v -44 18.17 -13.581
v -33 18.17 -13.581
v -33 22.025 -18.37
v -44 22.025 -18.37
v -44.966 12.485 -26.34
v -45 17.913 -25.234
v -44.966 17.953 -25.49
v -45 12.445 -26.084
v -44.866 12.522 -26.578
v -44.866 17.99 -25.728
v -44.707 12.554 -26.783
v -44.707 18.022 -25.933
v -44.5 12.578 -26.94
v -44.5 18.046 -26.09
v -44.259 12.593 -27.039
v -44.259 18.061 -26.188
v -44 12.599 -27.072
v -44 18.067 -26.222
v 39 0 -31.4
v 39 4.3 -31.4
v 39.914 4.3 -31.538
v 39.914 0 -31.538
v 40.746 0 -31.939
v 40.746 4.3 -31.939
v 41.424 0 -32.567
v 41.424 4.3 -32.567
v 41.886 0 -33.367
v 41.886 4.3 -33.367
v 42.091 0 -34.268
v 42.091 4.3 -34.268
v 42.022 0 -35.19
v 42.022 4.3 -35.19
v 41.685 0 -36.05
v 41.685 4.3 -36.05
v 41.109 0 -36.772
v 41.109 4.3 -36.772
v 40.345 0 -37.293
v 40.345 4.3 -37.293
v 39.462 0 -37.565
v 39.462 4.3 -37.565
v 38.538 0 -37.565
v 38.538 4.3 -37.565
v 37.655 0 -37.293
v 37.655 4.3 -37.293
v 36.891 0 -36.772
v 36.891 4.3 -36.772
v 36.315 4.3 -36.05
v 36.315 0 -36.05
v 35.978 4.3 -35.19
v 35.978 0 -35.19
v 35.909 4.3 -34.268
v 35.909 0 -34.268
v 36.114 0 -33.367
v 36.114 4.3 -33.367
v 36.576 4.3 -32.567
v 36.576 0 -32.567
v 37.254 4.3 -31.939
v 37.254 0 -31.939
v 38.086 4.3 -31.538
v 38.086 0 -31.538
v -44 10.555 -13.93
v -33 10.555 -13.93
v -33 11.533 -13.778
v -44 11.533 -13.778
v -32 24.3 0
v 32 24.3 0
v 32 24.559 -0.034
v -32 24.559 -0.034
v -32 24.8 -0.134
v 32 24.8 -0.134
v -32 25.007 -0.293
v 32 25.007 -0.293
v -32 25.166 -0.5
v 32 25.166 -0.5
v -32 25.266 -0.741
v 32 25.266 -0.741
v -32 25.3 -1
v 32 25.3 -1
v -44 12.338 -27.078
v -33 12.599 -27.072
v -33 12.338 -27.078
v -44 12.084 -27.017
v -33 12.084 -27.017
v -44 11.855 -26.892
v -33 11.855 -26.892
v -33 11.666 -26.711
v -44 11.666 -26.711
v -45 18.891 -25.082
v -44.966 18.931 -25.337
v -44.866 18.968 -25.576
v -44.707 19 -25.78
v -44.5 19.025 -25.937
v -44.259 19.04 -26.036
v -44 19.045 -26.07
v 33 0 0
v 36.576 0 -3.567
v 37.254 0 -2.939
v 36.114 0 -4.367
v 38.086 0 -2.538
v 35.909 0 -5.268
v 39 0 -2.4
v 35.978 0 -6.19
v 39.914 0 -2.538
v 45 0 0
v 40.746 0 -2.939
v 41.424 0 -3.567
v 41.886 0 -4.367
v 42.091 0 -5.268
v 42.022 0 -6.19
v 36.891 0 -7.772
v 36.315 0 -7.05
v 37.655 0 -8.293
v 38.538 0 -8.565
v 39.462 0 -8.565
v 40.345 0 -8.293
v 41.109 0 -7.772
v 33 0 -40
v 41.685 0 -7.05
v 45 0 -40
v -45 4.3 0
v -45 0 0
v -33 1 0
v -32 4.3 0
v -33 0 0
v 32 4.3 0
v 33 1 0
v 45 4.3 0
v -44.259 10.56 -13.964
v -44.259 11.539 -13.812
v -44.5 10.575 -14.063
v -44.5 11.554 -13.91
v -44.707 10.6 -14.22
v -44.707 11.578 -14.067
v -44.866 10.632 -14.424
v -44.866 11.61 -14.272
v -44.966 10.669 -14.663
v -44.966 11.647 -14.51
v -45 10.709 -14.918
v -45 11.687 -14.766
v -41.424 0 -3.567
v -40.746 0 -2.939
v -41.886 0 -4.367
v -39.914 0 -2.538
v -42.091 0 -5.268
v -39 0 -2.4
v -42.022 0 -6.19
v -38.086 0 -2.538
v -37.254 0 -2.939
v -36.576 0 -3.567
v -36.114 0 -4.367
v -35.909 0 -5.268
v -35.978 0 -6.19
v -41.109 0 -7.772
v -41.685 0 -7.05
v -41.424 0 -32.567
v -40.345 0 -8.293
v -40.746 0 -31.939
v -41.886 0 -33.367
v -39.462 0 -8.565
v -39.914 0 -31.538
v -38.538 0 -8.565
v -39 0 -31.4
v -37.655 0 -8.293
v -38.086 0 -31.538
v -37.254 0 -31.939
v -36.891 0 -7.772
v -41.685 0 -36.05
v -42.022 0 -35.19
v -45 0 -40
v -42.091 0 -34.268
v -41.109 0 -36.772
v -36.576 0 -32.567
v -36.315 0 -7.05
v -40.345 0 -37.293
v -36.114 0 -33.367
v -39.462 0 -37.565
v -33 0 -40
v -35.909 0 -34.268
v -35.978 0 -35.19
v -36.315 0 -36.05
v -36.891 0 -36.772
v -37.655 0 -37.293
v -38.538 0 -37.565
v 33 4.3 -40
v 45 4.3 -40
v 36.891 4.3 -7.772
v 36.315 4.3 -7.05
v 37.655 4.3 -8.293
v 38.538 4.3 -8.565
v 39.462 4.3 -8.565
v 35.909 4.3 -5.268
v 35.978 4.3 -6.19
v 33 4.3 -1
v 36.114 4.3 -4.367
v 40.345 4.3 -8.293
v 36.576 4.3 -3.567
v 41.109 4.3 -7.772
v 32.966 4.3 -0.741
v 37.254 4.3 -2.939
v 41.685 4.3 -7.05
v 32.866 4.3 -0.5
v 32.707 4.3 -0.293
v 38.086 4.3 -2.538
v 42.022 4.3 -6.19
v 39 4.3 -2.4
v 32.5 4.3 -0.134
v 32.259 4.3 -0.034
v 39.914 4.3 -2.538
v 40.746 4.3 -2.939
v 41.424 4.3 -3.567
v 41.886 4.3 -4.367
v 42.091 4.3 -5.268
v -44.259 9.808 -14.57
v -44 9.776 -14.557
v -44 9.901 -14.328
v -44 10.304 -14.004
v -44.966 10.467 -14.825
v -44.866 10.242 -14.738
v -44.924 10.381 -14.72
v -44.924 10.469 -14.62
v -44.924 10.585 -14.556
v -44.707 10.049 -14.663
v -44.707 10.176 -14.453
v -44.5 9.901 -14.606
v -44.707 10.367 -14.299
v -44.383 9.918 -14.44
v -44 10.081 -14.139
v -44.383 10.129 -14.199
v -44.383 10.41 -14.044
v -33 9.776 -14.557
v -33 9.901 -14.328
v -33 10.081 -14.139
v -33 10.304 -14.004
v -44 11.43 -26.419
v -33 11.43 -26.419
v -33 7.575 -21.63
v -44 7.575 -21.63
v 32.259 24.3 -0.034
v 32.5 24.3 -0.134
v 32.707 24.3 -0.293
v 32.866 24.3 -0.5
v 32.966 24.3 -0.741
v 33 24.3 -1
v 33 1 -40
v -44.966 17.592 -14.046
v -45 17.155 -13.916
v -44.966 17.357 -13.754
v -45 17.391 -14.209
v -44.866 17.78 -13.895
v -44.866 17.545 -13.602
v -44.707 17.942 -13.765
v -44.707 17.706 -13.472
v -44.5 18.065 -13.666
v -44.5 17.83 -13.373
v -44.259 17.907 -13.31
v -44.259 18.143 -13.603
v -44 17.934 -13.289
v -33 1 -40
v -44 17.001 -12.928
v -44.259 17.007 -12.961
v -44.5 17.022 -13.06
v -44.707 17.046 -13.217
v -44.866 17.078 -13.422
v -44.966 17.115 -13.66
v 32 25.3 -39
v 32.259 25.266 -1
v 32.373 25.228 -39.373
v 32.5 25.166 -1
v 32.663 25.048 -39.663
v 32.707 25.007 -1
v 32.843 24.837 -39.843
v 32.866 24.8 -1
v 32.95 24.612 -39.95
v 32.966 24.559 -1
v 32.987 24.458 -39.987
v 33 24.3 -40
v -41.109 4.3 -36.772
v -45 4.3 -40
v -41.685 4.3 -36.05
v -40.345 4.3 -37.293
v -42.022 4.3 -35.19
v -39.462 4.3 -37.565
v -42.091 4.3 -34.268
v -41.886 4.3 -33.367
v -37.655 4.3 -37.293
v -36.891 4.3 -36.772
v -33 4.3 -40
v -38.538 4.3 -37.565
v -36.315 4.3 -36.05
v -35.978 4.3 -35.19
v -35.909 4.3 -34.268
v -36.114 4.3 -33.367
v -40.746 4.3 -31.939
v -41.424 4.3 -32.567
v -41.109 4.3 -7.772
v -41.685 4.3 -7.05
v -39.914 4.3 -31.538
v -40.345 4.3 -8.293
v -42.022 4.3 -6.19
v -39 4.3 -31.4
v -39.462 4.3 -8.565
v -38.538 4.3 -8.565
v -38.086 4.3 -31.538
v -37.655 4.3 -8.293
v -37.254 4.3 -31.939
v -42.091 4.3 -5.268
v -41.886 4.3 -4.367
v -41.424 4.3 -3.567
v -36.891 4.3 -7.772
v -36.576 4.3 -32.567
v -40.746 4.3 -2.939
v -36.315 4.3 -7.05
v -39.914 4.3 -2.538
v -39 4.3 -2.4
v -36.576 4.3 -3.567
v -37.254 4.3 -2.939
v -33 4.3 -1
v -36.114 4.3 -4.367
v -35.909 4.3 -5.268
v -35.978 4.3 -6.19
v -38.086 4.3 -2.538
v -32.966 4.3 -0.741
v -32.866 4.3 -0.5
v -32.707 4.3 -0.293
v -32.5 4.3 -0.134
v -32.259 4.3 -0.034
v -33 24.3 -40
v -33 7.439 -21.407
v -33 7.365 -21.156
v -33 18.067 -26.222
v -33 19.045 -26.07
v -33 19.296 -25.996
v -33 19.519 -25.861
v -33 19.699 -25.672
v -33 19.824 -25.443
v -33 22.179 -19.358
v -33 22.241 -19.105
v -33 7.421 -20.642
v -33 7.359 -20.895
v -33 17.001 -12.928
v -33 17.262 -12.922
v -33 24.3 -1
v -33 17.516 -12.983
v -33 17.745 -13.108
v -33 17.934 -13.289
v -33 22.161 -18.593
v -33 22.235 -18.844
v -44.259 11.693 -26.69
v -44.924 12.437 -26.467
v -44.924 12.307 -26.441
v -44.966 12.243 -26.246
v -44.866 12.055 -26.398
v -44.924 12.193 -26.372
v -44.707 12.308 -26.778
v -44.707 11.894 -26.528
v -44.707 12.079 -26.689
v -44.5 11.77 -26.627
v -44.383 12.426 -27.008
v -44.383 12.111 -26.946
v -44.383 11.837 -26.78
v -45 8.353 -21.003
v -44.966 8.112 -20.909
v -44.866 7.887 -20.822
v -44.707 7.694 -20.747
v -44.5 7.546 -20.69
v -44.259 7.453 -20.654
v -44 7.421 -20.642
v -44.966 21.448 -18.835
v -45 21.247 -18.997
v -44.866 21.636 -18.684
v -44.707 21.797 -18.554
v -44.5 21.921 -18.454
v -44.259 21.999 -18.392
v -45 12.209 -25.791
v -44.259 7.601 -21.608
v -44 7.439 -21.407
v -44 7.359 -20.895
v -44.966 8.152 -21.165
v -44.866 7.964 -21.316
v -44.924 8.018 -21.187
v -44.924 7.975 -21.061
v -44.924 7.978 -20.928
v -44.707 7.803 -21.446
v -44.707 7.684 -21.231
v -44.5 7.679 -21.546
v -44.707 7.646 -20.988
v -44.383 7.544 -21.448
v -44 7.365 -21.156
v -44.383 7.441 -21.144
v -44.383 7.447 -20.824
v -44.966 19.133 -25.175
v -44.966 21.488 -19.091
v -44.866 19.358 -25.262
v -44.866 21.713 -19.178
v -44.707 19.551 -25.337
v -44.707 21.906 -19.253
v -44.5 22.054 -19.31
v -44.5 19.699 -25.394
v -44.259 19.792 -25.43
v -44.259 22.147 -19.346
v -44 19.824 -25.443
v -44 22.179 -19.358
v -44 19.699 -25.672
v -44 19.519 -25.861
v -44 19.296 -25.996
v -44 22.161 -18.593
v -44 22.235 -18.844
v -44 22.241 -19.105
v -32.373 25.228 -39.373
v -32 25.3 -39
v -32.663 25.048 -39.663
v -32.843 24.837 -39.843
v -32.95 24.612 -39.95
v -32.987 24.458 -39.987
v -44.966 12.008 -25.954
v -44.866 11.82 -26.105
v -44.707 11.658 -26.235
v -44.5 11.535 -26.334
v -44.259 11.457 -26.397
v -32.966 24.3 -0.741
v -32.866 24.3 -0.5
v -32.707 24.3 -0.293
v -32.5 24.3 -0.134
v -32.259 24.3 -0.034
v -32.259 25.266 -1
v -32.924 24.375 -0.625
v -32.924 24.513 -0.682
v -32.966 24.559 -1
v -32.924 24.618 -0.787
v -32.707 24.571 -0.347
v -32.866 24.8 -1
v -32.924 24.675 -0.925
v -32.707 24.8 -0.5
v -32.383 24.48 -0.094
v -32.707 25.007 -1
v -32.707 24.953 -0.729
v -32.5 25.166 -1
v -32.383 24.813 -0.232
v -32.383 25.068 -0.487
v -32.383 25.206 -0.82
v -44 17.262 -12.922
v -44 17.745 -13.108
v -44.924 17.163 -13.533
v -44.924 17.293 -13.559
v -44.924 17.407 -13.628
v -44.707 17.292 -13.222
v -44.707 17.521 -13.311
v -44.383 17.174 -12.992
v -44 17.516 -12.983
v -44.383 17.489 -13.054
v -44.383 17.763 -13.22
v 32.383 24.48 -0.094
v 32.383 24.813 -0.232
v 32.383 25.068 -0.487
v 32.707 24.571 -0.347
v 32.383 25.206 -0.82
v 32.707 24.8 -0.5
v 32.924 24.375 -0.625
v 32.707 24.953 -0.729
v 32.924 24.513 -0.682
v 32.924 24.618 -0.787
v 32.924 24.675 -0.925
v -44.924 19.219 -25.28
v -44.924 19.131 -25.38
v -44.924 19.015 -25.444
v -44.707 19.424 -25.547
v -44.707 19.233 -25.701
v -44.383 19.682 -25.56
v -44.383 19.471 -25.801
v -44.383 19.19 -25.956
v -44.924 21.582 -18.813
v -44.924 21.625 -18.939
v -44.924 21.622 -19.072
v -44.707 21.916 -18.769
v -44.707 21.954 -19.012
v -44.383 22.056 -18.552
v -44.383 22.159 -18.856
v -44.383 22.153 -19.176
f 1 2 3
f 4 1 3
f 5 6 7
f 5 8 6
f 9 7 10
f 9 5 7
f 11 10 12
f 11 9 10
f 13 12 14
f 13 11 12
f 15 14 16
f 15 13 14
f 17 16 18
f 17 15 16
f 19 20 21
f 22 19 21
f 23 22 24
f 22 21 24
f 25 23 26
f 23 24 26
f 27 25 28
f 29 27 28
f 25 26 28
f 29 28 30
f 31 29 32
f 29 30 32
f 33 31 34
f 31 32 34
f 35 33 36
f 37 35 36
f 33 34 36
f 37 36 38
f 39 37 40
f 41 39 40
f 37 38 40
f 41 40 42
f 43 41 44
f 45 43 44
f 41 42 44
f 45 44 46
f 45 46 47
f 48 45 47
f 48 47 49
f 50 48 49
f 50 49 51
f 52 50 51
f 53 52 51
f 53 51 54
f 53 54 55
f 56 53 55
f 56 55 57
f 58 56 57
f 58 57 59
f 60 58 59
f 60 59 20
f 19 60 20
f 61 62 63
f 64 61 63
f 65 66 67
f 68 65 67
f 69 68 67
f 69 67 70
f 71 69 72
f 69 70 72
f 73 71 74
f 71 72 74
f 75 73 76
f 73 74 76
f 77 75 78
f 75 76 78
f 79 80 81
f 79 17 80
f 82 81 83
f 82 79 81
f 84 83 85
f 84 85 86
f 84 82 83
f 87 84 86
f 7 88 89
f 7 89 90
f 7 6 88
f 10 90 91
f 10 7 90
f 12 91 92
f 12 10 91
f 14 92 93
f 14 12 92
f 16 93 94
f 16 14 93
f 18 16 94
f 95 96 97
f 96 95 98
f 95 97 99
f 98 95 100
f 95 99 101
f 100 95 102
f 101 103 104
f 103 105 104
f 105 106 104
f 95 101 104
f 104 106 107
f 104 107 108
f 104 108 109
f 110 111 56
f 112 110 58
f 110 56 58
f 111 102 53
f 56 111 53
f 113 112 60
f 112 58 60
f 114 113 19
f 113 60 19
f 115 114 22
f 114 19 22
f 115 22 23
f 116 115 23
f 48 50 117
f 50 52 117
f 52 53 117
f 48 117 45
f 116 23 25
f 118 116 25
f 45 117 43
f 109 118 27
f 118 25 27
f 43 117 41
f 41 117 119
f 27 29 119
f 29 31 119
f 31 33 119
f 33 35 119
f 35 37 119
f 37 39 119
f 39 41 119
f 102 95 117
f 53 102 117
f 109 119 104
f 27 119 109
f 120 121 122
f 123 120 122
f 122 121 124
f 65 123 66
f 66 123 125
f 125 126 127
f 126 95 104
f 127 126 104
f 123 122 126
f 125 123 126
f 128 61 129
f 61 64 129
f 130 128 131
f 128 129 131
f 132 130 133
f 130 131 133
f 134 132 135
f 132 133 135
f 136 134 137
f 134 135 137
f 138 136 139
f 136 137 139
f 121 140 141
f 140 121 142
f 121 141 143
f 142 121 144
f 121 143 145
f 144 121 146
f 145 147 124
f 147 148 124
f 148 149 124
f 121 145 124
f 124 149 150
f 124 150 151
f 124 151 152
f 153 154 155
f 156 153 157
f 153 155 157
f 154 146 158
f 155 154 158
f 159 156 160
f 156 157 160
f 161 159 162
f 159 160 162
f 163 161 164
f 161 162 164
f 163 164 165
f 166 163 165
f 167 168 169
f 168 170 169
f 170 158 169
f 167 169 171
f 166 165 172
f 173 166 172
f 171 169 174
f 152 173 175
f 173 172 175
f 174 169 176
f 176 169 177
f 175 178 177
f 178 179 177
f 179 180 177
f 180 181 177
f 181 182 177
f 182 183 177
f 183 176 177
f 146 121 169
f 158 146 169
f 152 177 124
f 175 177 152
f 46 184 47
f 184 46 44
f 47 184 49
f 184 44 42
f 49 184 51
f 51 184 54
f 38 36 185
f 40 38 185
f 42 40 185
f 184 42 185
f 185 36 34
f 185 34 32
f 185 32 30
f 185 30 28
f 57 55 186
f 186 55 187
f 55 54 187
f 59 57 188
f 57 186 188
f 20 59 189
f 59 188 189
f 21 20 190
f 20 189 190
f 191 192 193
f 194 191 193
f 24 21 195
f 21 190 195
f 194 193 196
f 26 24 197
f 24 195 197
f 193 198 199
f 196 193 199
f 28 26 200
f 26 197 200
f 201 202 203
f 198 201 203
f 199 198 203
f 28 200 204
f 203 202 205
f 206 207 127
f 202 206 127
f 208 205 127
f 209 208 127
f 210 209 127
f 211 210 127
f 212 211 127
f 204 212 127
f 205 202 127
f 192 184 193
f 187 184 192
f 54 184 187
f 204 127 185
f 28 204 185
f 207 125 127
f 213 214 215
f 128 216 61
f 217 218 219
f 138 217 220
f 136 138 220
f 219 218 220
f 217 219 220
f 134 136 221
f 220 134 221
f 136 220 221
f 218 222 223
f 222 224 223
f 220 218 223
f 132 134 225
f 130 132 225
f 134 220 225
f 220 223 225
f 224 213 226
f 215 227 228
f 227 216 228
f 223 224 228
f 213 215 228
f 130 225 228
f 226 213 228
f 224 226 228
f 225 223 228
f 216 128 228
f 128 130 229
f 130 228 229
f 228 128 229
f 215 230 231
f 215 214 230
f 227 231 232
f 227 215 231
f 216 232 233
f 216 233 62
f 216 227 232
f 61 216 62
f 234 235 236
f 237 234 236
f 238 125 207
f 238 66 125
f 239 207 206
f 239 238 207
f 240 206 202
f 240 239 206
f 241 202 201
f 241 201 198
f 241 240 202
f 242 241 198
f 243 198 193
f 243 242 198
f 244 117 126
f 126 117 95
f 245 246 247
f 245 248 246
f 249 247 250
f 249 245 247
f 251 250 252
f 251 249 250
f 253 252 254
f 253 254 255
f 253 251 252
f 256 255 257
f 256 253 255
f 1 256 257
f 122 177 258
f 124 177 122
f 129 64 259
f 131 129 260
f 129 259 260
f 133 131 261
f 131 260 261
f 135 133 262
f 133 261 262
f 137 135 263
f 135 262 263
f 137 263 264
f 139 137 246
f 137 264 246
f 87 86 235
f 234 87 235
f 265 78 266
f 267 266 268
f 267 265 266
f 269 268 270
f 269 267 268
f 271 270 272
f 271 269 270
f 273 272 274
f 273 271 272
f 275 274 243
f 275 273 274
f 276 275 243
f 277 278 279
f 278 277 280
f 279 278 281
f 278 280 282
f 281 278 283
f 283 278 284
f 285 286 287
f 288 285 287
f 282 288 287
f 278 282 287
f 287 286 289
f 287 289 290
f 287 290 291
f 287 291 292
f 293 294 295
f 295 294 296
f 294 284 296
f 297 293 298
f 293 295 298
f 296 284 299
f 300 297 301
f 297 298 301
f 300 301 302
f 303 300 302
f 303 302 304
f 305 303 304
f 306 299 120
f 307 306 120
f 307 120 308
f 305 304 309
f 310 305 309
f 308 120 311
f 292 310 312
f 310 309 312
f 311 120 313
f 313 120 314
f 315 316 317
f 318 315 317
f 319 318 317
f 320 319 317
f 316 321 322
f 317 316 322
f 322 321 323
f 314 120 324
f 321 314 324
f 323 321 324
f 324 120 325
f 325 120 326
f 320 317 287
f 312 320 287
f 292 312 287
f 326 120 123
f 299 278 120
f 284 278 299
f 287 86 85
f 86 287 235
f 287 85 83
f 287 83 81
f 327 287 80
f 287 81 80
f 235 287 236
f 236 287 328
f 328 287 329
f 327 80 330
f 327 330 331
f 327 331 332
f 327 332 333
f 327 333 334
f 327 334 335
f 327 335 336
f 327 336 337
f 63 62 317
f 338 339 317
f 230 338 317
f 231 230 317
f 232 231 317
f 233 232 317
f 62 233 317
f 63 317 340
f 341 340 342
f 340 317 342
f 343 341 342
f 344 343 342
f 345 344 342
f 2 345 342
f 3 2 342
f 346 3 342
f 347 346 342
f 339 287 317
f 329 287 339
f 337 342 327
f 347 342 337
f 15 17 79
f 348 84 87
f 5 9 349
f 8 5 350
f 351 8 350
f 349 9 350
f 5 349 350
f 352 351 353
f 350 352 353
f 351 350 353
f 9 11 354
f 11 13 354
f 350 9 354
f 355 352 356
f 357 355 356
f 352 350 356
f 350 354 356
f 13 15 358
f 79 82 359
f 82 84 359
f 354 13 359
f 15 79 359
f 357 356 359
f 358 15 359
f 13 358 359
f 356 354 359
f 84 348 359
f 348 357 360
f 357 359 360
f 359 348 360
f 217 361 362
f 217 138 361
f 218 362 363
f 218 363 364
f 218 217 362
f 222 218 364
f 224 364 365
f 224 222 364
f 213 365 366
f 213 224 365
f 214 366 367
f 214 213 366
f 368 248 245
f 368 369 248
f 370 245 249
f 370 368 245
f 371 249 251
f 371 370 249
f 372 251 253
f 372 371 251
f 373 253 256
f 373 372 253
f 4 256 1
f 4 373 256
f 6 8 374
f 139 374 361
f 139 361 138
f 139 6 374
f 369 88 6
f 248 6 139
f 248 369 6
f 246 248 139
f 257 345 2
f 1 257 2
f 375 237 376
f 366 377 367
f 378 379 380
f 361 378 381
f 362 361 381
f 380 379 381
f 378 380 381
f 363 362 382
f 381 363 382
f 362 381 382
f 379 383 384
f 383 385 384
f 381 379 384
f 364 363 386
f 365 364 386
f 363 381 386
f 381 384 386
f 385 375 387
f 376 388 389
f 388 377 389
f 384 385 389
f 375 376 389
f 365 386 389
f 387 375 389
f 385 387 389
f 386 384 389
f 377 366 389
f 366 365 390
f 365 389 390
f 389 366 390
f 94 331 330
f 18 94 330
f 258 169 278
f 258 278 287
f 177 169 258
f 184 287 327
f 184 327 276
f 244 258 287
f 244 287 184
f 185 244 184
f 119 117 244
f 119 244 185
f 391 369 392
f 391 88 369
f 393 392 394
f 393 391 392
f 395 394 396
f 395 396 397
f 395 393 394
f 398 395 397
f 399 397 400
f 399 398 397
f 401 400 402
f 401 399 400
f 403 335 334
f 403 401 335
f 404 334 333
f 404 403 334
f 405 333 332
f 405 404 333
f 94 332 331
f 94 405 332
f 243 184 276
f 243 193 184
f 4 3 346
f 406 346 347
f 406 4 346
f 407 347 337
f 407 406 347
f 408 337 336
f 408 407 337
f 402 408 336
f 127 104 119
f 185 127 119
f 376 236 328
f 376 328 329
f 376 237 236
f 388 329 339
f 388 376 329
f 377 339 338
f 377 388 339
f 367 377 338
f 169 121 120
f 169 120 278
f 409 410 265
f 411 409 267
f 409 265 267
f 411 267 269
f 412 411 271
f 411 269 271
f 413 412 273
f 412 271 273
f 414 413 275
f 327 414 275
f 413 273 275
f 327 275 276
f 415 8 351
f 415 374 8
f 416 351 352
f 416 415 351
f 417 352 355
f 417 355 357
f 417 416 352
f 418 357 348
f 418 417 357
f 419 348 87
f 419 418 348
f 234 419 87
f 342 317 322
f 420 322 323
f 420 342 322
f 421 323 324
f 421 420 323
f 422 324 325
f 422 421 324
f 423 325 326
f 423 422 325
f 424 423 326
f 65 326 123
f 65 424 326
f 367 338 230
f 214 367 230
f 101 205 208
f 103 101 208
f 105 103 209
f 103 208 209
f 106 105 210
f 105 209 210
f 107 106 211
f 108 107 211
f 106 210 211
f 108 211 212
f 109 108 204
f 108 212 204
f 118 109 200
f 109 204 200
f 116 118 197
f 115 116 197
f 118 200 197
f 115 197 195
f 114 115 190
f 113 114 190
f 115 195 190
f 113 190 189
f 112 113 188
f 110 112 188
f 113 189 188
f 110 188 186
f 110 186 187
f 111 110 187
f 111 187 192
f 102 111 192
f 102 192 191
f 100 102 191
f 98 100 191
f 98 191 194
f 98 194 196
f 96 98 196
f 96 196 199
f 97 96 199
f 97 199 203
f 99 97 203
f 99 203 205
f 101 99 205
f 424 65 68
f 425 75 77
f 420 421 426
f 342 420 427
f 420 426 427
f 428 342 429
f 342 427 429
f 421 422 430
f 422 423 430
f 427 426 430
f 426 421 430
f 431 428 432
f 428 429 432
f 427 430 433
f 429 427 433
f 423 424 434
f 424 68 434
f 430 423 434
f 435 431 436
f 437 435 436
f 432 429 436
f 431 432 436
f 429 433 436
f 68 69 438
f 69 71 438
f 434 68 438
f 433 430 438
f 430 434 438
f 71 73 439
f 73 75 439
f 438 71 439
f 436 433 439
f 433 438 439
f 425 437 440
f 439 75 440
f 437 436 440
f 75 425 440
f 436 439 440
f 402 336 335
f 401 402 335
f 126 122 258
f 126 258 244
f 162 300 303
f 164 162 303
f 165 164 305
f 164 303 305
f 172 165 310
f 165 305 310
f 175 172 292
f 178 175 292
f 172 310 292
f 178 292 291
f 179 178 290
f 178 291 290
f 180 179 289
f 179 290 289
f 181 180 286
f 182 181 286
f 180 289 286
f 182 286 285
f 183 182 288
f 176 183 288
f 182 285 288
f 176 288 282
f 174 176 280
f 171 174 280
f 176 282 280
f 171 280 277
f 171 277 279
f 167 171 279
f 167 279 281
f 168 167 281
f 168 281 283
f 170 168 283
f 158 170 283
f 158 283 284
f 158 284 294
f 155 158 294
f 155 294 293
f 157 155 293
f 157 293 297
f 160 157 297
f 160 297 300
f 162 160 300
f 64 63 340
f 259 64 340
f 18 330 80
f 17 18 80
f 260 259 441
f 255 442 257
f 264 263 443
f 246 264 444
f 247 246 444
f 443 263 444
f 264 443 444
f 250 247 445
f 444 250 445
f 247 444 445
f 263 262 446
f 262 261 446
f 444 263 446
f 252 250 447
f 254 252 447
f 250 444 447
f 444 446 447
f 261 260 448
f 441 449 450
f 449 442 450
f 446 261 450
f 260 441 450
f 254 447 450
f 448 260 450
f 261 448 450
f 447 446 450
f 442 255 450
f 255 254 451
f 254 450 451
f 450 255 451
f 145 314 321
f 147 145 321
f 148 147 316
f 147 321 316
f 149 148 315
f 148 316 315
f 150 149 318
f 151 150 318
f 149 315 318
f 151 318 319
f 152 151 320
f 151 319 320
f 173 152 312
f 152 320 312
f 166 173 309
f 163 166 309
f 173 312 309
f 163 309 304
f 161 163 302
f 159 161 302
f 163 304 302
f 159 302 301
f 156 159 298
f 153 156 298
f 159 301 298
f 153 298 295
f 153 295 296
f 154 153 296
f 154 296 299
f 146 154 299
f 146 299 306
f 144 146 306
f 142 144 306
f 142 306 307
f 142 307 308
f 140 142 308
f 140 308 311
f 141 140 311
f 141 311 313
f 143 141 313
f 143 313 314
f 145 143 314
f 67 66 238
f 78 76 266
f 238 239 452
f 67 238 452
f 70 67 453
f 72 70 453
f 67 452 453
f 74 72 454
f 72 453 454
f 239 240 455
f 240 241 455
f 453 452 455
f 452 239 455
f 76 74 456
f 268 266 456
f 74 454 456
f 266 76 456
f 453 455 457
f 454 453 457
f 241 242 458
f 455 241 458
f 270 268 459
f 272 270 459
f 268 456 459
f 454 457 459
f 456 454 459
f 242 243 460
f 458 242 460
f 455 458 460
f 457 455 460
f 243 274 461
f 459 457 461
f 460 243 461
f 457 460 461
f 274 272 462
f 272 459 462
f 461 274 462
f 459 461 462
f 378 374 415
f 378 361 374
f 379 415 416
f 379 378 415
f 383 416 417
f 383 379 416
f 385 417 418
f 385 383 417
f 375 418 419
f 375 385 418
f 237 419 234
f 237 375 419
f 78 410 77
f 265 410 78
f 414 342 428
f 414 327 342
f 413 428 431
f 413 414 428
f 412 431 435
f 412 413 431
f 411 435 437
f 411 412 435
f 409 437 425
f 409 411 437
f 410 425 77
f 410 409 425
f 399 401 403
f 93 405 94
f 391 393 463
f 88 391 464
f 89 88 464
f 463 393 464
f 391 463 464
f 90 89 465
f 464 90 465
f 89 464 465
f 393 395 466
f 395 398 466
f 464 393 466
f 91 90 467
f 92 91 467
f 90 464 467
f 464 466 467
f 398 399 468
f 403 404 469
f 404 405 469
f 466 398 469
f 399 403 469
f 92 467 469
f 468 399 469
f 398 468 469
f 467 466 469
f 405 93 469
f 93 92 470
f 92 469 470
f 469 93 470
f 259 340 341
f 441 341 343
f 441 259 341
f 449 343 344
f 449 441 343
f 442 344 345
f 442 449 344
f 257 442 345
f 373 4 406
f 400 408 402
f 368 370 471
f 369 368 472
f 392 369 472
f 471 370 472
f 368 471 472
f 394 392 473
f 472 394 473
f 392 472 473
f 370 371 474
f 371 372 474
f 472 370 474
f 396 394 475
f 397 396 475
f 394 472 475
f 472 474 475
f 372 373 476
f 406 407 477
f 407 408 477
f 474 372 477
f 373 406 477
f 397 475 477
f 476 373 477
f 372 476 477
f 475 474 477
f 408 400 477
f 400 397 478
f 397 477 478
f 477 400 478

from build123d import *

# Parameters (mm, degrees)
SKETCH_13_W         = 90
SKETCH_13_H         = 40
EXTRUDE_8_DEPTH     = 25.3
SKETCH_15_W         = 66
SKETCH_15_H         = 40
CUT_EXTRUDE_3_DEPTH = 1
SKETCH_17_W         = 12
SKETCH_17_H         = 21
CUT_EXTRUDE_4_DEPTH = 40
EXTRUDE_10_DEPTH    = 12
FILLET_1_R          = 1
FILLET_2_R          = 1
FILLET_3_R          = 1
CUT_EXTRUDE_5_REACH = 65.765
SKETCH_22_R         = 3.1


with BuildPart() as part:
    # 草图13 → 凸台-拉伸8 (new body)
    with BuildSketch(Plane(origin=(0, 0, 0), x_dir=(1, 0, 0), z_dir=(0, 1, 0))):
        with Locations((0, 20)):
            Rectangle(SKETCH_13_W, SKETCH_13_H)
    extrude(amount=EXTRUDE_8_DEPTH)

    # 草图15 → 切除-拉伸3 (cut)
    with BuildSketch(Plane.XZ):
        with Locations((0, -20)):
            Rectangle(SKETCH_15_W, SKETCH_15_H)
    extrude(amount=-CUT_EXTRUDE_3_DEPTH, mode=Mode.SUBTRACT)

    # 草图17 → 切除-拉伸4 (cut)
    with BuildSketch(Plane.XY):
        with Locations((-39, 14.8)):
            Rectangle(SKETCH_17_W, SKETCH_17_H)
        with Locations((39, 14.8)):
            Rectangle(SKETCH_17_W, SKETCH_17_H)
    extrude(amount=-CUT_EXTRUDE_4_DEPTH, mode=Mode.SUBTRACT)

    # 草图19 → 凸台-拉伸10 (add)
    with BuildSketch(Plane.ZY.offset(33)):
        Polygon((-13.58148117, 18.169722386), (-20, 14.8), (-13.778047619, 11.533475), (-12.839009712, 17.571921973), align=None)
        Polygon((-25.98104999, 19.61563852), (-26.221952381, 18.066525), (-20, 14.8), (-13.58148117, 18.169722386), (-18.820059701, 22.387560492), align=None)
        Polygon((-20, 14.8), (-26.221952381, 18.066525), (-27.160990288, 12.028078027), (-26.41851883, 11.430277614), align=None)
        Polygon((-13.778047619, 11.533475), (-20, 14.8), (-26.41851883, 11.430277614), (-21.179940299, 7.212439508), (-14.01895001, 9.98436148), align=None)
    extrude(amount=EXTRUDE_10_DEPTH)

    # 圆角1
    fillet_1_edges = [part.edges().sort_by_distance(p)[0] for p in [
        (0, 25.3, 0),
    ]]
    fillet(fillet_1_edges, radius=FILLET_1_R)

    # 圆角2
    fillet_2_edges = [part.edges().sort_by_distance(p)[0] for p in [
        (0, 25.3, -40),
        (-33, 25.3, -20.5),
        (-33, 14.3, 0),
        (33, 14.3, 0),
        (33, 25.3, -20.5),
        (33, 25.007106781, -0.292893219),
        (-33, 25.007106781, -0.292893219),
    ]]
    fillet(fillet_2_edges, radius=FILLET_2_R)

    # 圆角3
    fillet_3_edges = [part.edges().sort_by_distance(p)[0] for p in [
        (-45, 21.001599506, -22.400554846),
        (-39, 22.387560492, -18.820059701),
        (-45, 19.979741232, -15.829534706),
        (-39, 17.571921973, -12.839009712),
        (-45, 13.778141726, -13.428979861),
        (-39, 9.98436148, -14.01895001),
        (-45, 8.598400494, -17.599445154),
        (-39, 7.212439508, -21.179940299),
        (-45, 9.620258768, -24.170465294),
        (-39, 12.028078027, -27.160990288),
        (-45, 15.821858274, -26.571020139),
        (-39, 19.61563852, -25.98104999),
    ]]
    fillet(fillet_3_edges, radius=FILLET_3_R)

    # 草图22 → 切除-拉伸5 (cut, up to next)
    with BuildSketch(Plane(origin=(0, 4.3, 0), x_dir=(1, 0, 0), z_dir=(0, 1, 0)), mode=Mode.PRIVATE) as cut_extrude_5_sk1:
        with Locations(Location((-39, 5.5, 0), (0, 0, 270))):
            Circle(SKETCH_22_R)
    cut_extrude_5_tool1 = extrude(cut_extrude_5_sk1.sketch, amount=-CUT_EXTRUDE_5_REACH, mode=Mode.PRIVATE) & part.part
    # 草图22 → 切除-拉伸5 (cut, up to next)
    with BuildSketch(Plane(origin=(0, 4.3, 0), x_dir=(1, 0, 0), z_dir=(0, 1, 0)), mode=Mode.PRIVATE) as cut_extrude_5_sk2:
        with Locations(Location((39, 5.5, 0), (0, 0, 270))):
            Circle(SKETCH_22_R)
    cut_extrude_5_tool2 = extrude(cut_extrude_5_sk2.sketch, amount=-CUT_EXTRUDE_5_REACH, mode=Mode.PRIVATE) & part.part
    # 草图22 → 切除-拉伸5 (cut, up to next)
    with BuildSketch(Plane(origin=(0, 4.3, 0), x_dir=(1, 0, 0), z_dir=(0, 1, 0)), mode=Mode.PRIVATE) as cut_extrude_5_sk3:
        with Locations(Location((39, 34.5, 0), (0, 0, 270))):
            Circle(SKETCH_22_R)
    cut_extrude_5_tool3 = extrude(cut_extrude_5_sk3.sketch, amount=-CUT_EXTRUDE_5_REACH, mode=Mode.PRIVATE) & part.part
    # 草图22 → 切除-拉伸5 (cut, up to next)
    with BuildSketch(Plane(origin=(0, 4.3, 0), x_dir=(1, 0, 0), z_dir=(0, 1, 0)), mode=Mode.PRIVATE) as cut_extrude_5_sk4:
        with Locations(Location((-39, 34.5, 0), (0, 0, 270))):
            Circle(SKETCH_22_R)
    cut_extrude_5_tool4 = extrude(cut_extrude_5_sk4.sketch, amount=-CUT_EXTRUDE_5_REACH, mode=Mode.PRIVATE) & part.part
    add(cut_extrude_5_tool1.solids().sort_by_distance((-39, 4.3, -5.5))[0], mode=Mode.SUBTRACT)
    add(cut_extrude_5_tool2.solids().sort_by_distance((39, 4.3, -5.5))[0], mode=Mode.SUBTRACT)
    add(cut_extrude_5_tool3.solids().sort_by_distance((39, 4.3, -34.5))[0], mode=Mode.SUBTRACT)
    add(cut_extrude_5_tool4.solids().sort_by_distance((-39, 4.3, -34.5))[0], mode=Mode.SUBTRACT)


solid = part.part
